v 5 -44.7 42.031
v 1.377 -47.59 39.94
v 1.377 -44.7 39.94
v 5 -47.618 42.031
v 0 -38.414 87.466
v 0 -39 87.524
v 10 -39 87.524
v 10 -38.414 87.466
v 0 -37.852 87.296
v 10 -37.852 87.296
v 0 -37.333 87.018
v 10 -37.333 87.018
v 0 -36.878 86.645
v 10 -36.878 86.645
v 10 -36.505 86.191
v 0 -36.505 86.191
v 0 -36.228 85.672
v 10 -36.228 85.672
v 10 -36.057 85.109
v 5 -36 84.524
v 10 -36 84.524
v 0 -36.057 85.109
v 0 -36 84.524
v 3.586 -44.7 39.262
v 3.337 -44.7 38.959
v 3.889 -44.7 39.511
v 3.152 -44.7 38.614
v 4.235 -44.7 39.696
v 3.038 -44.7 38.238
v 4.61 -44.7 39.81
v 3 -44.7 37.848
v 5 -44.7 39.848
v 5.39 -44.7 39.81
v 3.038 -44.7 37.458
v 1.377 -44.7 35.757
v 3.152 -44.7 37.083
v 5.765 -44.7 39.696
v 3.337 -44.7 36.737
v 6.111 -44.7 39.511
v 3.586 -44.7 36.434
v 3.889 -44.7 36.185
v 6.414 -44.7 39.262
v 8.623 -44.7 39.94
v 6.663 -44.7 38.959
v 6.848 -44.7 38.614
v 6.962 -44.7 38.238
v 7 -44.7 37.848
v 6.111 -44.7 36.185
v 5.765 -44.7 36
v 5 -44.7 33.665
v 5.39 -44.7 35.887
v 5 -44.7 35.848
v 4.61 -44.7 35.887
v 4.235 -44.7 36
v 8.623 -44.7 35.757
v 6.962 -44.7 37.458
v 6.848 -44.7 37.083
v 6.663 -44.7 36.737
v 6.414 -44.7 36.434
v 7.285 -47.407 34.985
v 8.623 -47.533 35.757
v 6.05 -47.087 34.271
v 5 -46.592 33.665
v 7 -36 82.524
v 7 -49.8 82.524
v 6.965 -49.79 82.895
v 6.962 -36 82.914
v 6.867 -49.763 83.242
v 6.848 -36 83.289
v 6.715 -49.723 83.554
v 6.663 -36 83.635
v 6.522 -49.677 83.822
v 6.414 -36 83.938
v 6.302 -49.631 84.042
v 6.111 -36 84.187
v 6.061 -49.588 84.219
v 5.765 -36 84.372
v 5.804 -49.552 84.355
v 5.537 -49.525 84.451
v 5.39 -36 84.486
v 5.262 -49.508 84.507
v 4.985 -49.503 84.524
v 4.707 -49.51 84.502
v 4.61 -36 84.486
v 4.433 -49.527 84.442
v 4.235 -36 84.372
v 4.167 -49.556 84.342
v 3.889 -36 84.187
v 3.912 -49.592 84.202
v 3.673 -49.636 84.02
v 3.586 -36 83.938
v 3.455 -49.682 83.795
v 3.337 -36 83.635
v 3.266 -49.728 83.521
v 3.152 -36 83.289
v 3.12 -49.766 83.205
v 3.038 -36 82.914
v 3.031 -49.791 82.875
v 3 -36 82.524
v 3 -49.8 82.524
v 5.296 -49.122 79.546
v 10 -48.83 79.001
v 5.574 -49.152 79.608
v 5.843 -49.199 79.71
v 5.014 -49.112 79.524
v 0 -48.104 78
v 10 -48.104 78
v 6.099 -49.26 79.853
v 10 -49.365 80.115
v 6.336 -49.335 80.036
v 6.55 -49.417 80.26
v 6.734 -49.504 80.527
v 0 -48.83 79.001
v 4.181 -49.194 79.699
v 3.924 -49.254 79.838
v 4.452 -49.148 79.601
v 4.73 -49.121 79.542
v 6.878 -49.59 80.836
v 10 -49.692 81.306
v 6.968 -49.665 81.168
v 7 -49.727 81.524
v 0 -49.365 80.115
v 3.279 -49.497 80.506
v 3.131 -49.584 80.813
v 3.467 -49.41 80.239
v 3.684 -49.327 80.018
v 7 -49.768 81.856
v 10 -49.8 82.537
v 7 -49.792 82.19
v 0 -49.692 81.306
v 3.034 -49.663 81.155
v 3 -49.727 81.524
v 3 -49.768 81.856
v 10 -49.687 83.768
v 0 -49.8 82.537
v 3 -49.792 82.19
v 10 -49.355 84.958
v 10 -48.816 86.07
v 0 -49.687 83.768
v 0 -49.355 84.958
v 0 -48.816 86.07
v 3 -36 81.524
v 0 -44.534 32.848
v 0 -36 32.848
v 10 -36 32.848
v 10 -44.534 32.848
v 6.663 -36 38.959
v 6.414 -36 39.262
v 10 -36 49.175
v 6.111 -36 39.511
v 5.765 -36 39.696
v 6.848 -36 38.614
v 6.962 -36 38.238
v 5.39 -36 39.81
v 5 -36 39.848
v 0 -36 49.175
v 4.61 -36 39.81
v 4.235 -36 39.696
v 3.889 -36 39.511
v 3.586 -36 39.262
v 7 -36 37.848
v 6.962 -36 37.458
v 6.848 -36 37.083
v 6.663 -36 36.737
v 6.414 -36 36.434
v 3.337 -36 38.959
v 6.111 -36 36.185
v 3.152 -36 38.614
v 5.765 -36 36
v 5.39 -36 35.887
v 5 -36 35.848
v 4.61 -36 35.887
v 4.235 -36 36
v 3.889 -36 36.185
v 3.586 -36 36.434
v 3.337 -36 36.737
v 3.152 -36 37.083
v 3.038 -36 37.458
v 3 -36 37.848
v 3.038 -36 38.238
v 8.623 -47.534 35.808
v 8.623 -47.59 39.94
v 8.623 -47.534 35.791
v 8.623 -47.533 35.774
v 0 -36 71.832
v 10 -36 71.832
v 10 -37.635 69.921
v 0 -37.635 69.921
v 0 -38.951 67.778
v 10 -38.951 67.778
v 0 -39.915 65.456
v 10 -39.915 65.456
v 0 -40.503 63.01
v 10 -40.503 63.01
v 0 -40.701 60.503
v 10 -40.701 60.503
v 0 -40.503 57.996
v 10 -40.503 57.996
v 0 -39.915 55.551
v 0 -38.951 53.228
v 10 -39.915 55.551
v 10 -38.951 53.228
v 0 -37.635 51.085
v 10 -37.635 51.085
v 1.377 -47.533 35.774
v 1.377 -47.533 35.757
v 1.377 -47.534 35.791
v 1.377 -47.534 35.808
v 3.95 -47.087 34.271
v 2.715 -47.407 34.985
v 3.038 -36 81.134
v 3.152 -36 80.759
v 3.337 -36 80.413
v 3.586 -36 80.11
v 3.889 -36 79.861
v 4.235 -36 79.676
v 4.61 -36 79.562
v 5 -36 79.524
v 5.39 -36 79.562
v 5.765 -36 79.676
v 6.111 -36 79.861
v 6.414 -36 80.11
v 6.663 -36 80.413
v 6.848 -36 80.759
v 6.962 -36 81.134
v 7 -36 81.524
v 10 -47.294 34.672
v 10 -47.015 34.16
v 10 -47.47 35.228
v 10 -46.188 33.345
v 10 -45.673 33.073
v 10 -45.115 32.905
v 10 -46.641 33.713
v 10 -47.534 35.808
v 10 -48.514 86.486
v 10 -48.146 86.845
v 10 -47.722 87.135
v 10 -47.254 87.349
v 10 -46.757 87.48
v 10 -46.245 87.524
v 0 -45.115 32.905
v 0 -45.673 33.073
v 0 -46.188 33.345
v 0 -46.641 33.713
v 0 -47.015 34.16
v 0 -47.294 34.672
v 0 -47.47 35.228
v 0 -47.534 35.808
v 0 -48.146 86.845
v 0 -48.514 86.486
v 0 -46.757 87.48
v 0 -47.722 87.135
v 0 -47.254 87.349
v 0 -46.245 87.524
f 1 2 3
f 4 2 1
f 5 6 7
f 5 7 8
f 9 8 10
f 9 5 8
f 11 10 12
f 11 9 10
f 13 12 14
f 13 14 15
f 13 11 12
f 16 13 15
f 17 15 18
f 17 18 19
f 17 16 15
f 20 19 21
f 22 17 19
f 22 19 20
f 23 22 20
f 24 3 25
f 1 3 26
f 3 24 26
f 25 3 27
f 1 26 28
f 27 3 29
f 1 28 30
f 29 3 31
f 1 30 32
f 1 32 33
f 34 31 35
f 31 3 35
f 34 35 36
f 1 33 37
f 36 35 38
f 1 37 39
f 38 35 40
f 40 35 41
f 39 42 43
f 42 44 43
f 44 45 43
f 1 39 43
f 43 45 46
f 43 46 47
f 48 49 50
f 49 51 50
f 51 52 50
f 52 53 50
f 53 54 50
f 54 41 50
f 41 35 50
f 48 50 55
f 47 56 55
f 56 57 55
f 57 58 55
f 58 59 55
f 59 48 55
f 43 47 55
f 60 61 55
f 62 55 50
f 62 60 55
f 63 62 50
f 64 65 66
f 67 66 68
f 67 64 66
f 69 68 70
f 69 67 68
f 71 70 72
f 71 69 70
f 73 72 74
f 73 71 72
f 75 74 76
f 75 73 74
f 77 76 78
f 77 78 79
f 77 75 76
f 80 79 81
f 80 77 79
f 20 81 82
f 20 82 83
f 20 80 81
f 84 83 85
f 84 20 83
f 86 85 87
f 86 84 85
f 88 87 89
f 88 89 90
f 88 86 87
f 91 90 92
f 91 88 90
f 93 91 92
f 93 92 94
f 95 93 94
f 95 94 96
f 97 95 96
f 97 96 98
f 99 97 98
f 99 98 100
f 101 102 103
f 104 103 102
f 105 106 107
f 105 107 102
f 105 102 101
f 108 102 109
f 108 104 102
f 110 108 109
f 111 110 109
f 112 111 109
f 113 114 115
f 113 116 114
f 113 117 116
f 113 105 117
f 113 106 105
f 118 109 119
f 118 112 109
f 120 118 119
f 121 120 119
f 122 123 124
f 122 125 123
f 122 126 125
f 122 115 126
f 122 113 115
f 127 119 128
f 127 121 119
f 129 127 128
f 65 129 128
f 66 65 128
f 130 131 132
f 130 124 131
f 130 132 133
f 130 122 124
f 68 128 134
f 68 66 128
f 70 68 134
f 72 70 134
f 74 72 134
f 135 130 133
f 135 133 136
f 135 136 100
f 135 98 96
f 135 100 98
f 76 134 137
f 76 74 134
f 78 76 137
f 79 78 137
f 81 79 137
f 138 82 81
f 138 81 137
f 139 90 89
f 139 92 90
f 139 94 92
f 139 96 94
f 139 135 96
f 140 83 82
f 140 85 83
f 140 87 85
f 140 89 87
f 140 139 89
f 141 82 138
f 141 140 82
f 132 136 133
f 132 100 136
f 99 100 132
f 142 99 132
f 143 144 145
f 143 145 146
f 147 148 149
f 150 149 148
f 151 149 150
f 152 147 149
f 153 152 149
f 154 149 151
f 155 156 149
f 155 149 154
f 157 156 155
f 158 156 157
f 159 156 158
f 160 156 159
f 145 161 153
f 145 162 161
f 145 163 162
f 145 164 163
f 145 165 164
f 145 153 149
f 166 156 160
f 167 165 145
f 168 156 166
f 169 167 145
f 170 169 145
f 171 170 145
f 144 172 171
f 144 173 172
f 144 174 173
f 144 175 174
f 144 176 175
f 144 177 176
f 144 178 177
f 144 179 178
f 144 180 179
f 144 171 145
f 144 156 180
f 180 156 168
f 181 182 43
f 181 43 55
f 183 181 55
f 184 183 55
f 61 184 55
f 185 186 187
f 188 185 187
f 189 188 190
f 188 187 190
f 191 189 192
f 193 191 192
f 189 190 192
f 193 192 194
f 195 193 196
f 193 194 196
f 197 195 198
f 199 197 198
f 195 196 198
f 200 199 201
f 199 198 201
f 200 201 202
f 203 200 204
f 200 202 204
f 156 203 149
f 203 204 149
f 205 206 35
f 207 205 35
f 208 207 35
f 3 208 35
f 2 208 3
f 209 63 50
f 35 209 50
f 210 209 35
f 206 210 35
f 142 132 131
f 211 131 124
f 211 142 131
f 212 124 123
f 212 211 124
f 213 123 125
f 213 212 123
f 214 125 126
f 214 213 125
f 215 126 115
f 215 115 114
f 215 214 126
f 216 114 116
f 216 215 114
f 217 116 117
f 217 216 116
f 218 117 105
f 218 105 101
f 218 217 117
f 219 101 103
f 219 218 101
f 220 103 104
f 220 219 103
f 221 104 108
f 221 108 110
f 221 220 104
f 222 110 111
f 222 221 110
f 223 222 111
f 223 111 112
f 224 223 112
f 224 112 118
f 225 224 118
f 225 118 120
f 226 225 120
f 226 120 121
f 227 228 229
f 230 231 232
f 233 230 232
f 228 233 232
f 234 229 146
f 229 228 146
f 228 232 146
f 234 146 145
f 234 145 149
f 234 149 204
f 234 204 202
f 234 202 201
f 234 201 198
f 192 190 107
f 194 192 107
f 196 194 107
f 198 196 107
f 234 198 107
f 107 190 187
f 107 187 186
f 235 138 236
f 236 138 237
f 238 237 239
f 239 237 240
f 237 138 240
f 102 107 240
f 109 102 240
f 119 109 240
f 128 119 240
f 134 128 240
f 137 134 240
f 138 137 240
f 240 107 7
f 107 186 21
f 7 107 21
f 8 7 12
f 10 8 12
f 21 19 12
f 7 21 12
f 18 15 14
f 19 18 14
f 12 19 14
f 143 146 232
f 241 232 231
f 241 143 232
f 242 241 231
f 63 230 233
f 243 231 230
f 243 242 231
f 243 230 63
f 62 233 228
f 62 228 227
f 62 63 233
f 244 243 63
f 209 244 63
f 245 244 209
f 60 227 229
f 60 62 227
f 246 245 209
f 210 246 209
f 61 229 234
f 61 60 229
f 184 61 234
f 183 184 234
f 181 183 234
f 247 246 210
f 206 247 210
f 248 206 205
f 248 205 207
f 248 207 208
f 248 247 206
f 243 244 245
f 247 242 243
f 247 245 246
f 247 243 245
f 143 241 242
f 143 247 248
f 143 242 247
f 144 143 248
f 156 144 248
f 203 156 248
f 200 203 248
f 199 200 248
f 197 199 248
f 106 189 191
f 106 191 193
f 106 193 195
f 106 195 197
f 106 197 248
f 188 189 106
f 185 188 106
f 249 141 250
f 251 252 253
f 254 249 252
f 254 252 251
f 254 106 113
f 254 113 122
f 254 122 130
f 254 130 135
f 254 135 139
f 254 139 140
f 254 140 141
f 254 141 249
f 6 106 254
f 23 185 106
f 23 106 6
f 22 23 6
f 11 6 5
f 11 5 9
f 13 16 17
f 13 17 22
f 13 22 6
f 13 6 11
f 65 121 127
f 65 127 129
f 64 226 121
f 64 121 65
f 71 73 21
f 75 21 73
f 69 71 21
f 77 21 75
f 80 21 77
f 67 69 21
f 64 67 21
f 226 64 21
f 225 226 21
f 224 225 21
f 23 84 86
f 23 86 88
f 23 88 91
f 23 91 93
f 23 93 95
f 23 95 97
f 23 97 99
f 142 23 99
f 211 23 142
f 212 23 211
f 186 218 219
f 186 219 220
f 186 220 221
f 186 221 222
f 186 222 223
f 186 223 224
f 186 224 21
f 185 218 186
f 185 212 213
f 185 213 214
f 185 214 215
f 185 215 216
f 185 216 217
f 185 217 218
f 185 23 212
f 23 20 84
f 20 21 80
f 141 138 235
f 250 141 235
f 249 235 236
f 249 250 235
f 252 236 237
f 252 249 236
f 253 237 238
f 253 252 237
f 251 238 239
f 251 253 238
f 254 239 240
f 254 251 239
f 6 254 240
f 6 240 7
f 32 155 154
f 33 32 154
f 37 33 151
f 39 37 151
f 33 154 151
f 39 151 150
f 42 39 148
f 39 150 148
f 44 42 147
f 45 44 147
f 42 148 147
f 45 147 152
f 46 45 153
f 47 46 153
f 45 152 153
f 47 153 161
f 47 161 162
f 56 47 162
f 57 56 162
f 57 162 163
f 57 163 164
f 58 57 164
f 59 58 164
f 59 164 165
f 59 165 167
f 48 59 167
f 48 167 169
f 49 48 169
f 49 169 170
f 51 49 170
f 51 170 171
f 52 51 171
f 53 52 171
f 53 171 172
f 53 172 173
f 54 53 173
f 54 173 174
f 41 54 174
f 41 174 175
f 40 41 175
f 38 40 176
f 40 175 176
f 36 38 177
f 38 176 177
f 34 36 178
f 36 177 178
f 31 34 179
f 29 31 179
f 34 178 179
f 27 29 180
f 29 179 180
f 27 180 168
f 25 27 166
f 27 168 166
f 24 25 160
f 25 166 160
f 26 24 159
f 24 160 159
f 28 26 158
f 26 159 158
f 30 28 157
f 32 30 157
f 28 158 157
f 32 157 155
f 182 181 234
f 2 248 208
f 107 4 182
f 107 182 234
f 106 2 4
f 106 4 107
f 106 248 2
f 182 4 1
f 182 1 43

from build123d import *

# Parameters (mm, degrees)
BOSS_EXTRU_1_DEPTH      = 10
ENL_V_MAT_EXTRU_1_DEPTH = 90.16782474
ESQUISSE3_R             = 2
ENL_V_MAT_EXTRU_2_DEPTH = 90.167824766
ENL_V_MAT_EXTRU_3_DEPTH = 3.3
ENL_V_MAT_EXTRU_4_DEPTH = 102.195391925


with BuildPart() as part:
    # Esquisse1 → Boss.-Extru.1 (new body)
    with BuildSketch(Plane(origin=(0, 0, 0), x_dir=(0, 0, -1), z_dir=(1, 0, 0))):
        with BuildLine():
            Line((-87.523995303, -46.245048312), (-87.523995303, -38.999770184))
            ThreePointArc((-87.523995303, -38.999770184), (-86.645315647, -36.87844984), (-84.523995303, -35.999770184))
            Line((-84.523995303, -35.999770184), (-70.36921968, -35.999770184))
            ThreePointArc((-70.36921968, -35.999770184), (-60.503302019, -39.700935345), (-50.637384358, -35.999770184))
            Line((-50.637384358, -35.999770184), (-32.848182024, -35.999770184))
            Line((-32.848182024, -35.999770184), (-32.848182024, -44.534320741))
            ThreePointArc((-32.848182024, -44.534320741), (-33.712584856, -46.641267521), (-35.80766518, -47.534047126))
            Line((-35.80766518, -47.534047126), (-78.000260647, -48.103936043))
            ThreePointArc((-78.000260647, -48.103936043), (-81.919367341, -49.773558375), (-86.070253365, -48.815862581))
            ThreePointArc((-86.070253365, -48.815862581), (-87.135390925, -47.72173816), (-87.523995303, -46.245048312))
        make_face()
    extrude(amount=BOSS_EXTRU_1_DEPTH)

    # Esquisse2 → Enlèv. mat.-Extru.1 (cut, through all)
    with BuildSketch(Plane(origin=(0, -35.999770184, 0), x_dir=(1, 0, 0), z_dir=(0, 1, 0))):
        with BuildLine():
            Line((3, -82.523995303), (3, -81.523995303))
            ThreePointArc((3, -81.523995303), (5, -79.523995303), (7, -81.523995303))
            Line((7, -81.523995303), (7, -82.523995303))
            ThreePointArc((7, -82.523995303), (5, -84.523995303), (3, -82.523995303))
        make_face()
    extrude(amount=-ENL_V_MAT_EXTRU_1_DEPTH, mode=Mode.SUBTRACT)

    # Esquisse3 → Enlèv. mat.-Extru.2 (cut, through all)
    with BuildSketch(Plane(origin=(0, -35.999770184, 0), x_dir=(1, 0, 0), z_dir=(0, 1, 0))):
        with Locations(Location((5, -37.848182024, 0), (0, 0, 270))):
            Circle(ESQUISSE3_R)
    extrude(amount=-ENL_V_MAT_EXTRU_2_DEPTH, mode=Mode.SUBTRACT)

    # Esquisse4 → Enlèv. mat.-Extru.3 (cut)
    with BuildSketch(Plane(origin=(0, -47.999770184, 141.218220364), x_dir=(1, 0, 0), z_dir=(0, 1, 0))):
        Polygon((5, 107.552964167), (1.377479972, 105.461501254), (1.377479972, 101.278575427), (5, 99.187112513), (8.622520028, 101.278575427), (8.622520028, 105.461501254), align=None)
    extrude(amount=ENL_V_MAT_EXTRU_3_DEPTH, mode=Mode.SUBTRACT)

    # Esquisse5 → Enlèv. mat.-Extru.4 (cut, through all)
    with BuildSketch(Plane(origin=(10, 0, 0), x_dir=(0, 0, -1), z_dir=(1, 0, 0))):
        with BuildLine():
            Line((-70.36921968, -35.999770184), (-71.83186465, -35.999770184))
            ThreePointArc((-71.83186465, -35.999770184), (-60.503302019, -40.700935345), (-49.174739388, -35.999770184))
            Line((-49.174739388, -35.999770184), (-50.637384358, -35.999770184))
            Line((-50.637384358, -35.999770184), (-70.36921968, -35.999770184))
        make_face()
    extrude(amount=-ENL_V_MAT_EXTRU_4_DEPTH, mode=Mode.SUBTRACT)


solid = part.part
